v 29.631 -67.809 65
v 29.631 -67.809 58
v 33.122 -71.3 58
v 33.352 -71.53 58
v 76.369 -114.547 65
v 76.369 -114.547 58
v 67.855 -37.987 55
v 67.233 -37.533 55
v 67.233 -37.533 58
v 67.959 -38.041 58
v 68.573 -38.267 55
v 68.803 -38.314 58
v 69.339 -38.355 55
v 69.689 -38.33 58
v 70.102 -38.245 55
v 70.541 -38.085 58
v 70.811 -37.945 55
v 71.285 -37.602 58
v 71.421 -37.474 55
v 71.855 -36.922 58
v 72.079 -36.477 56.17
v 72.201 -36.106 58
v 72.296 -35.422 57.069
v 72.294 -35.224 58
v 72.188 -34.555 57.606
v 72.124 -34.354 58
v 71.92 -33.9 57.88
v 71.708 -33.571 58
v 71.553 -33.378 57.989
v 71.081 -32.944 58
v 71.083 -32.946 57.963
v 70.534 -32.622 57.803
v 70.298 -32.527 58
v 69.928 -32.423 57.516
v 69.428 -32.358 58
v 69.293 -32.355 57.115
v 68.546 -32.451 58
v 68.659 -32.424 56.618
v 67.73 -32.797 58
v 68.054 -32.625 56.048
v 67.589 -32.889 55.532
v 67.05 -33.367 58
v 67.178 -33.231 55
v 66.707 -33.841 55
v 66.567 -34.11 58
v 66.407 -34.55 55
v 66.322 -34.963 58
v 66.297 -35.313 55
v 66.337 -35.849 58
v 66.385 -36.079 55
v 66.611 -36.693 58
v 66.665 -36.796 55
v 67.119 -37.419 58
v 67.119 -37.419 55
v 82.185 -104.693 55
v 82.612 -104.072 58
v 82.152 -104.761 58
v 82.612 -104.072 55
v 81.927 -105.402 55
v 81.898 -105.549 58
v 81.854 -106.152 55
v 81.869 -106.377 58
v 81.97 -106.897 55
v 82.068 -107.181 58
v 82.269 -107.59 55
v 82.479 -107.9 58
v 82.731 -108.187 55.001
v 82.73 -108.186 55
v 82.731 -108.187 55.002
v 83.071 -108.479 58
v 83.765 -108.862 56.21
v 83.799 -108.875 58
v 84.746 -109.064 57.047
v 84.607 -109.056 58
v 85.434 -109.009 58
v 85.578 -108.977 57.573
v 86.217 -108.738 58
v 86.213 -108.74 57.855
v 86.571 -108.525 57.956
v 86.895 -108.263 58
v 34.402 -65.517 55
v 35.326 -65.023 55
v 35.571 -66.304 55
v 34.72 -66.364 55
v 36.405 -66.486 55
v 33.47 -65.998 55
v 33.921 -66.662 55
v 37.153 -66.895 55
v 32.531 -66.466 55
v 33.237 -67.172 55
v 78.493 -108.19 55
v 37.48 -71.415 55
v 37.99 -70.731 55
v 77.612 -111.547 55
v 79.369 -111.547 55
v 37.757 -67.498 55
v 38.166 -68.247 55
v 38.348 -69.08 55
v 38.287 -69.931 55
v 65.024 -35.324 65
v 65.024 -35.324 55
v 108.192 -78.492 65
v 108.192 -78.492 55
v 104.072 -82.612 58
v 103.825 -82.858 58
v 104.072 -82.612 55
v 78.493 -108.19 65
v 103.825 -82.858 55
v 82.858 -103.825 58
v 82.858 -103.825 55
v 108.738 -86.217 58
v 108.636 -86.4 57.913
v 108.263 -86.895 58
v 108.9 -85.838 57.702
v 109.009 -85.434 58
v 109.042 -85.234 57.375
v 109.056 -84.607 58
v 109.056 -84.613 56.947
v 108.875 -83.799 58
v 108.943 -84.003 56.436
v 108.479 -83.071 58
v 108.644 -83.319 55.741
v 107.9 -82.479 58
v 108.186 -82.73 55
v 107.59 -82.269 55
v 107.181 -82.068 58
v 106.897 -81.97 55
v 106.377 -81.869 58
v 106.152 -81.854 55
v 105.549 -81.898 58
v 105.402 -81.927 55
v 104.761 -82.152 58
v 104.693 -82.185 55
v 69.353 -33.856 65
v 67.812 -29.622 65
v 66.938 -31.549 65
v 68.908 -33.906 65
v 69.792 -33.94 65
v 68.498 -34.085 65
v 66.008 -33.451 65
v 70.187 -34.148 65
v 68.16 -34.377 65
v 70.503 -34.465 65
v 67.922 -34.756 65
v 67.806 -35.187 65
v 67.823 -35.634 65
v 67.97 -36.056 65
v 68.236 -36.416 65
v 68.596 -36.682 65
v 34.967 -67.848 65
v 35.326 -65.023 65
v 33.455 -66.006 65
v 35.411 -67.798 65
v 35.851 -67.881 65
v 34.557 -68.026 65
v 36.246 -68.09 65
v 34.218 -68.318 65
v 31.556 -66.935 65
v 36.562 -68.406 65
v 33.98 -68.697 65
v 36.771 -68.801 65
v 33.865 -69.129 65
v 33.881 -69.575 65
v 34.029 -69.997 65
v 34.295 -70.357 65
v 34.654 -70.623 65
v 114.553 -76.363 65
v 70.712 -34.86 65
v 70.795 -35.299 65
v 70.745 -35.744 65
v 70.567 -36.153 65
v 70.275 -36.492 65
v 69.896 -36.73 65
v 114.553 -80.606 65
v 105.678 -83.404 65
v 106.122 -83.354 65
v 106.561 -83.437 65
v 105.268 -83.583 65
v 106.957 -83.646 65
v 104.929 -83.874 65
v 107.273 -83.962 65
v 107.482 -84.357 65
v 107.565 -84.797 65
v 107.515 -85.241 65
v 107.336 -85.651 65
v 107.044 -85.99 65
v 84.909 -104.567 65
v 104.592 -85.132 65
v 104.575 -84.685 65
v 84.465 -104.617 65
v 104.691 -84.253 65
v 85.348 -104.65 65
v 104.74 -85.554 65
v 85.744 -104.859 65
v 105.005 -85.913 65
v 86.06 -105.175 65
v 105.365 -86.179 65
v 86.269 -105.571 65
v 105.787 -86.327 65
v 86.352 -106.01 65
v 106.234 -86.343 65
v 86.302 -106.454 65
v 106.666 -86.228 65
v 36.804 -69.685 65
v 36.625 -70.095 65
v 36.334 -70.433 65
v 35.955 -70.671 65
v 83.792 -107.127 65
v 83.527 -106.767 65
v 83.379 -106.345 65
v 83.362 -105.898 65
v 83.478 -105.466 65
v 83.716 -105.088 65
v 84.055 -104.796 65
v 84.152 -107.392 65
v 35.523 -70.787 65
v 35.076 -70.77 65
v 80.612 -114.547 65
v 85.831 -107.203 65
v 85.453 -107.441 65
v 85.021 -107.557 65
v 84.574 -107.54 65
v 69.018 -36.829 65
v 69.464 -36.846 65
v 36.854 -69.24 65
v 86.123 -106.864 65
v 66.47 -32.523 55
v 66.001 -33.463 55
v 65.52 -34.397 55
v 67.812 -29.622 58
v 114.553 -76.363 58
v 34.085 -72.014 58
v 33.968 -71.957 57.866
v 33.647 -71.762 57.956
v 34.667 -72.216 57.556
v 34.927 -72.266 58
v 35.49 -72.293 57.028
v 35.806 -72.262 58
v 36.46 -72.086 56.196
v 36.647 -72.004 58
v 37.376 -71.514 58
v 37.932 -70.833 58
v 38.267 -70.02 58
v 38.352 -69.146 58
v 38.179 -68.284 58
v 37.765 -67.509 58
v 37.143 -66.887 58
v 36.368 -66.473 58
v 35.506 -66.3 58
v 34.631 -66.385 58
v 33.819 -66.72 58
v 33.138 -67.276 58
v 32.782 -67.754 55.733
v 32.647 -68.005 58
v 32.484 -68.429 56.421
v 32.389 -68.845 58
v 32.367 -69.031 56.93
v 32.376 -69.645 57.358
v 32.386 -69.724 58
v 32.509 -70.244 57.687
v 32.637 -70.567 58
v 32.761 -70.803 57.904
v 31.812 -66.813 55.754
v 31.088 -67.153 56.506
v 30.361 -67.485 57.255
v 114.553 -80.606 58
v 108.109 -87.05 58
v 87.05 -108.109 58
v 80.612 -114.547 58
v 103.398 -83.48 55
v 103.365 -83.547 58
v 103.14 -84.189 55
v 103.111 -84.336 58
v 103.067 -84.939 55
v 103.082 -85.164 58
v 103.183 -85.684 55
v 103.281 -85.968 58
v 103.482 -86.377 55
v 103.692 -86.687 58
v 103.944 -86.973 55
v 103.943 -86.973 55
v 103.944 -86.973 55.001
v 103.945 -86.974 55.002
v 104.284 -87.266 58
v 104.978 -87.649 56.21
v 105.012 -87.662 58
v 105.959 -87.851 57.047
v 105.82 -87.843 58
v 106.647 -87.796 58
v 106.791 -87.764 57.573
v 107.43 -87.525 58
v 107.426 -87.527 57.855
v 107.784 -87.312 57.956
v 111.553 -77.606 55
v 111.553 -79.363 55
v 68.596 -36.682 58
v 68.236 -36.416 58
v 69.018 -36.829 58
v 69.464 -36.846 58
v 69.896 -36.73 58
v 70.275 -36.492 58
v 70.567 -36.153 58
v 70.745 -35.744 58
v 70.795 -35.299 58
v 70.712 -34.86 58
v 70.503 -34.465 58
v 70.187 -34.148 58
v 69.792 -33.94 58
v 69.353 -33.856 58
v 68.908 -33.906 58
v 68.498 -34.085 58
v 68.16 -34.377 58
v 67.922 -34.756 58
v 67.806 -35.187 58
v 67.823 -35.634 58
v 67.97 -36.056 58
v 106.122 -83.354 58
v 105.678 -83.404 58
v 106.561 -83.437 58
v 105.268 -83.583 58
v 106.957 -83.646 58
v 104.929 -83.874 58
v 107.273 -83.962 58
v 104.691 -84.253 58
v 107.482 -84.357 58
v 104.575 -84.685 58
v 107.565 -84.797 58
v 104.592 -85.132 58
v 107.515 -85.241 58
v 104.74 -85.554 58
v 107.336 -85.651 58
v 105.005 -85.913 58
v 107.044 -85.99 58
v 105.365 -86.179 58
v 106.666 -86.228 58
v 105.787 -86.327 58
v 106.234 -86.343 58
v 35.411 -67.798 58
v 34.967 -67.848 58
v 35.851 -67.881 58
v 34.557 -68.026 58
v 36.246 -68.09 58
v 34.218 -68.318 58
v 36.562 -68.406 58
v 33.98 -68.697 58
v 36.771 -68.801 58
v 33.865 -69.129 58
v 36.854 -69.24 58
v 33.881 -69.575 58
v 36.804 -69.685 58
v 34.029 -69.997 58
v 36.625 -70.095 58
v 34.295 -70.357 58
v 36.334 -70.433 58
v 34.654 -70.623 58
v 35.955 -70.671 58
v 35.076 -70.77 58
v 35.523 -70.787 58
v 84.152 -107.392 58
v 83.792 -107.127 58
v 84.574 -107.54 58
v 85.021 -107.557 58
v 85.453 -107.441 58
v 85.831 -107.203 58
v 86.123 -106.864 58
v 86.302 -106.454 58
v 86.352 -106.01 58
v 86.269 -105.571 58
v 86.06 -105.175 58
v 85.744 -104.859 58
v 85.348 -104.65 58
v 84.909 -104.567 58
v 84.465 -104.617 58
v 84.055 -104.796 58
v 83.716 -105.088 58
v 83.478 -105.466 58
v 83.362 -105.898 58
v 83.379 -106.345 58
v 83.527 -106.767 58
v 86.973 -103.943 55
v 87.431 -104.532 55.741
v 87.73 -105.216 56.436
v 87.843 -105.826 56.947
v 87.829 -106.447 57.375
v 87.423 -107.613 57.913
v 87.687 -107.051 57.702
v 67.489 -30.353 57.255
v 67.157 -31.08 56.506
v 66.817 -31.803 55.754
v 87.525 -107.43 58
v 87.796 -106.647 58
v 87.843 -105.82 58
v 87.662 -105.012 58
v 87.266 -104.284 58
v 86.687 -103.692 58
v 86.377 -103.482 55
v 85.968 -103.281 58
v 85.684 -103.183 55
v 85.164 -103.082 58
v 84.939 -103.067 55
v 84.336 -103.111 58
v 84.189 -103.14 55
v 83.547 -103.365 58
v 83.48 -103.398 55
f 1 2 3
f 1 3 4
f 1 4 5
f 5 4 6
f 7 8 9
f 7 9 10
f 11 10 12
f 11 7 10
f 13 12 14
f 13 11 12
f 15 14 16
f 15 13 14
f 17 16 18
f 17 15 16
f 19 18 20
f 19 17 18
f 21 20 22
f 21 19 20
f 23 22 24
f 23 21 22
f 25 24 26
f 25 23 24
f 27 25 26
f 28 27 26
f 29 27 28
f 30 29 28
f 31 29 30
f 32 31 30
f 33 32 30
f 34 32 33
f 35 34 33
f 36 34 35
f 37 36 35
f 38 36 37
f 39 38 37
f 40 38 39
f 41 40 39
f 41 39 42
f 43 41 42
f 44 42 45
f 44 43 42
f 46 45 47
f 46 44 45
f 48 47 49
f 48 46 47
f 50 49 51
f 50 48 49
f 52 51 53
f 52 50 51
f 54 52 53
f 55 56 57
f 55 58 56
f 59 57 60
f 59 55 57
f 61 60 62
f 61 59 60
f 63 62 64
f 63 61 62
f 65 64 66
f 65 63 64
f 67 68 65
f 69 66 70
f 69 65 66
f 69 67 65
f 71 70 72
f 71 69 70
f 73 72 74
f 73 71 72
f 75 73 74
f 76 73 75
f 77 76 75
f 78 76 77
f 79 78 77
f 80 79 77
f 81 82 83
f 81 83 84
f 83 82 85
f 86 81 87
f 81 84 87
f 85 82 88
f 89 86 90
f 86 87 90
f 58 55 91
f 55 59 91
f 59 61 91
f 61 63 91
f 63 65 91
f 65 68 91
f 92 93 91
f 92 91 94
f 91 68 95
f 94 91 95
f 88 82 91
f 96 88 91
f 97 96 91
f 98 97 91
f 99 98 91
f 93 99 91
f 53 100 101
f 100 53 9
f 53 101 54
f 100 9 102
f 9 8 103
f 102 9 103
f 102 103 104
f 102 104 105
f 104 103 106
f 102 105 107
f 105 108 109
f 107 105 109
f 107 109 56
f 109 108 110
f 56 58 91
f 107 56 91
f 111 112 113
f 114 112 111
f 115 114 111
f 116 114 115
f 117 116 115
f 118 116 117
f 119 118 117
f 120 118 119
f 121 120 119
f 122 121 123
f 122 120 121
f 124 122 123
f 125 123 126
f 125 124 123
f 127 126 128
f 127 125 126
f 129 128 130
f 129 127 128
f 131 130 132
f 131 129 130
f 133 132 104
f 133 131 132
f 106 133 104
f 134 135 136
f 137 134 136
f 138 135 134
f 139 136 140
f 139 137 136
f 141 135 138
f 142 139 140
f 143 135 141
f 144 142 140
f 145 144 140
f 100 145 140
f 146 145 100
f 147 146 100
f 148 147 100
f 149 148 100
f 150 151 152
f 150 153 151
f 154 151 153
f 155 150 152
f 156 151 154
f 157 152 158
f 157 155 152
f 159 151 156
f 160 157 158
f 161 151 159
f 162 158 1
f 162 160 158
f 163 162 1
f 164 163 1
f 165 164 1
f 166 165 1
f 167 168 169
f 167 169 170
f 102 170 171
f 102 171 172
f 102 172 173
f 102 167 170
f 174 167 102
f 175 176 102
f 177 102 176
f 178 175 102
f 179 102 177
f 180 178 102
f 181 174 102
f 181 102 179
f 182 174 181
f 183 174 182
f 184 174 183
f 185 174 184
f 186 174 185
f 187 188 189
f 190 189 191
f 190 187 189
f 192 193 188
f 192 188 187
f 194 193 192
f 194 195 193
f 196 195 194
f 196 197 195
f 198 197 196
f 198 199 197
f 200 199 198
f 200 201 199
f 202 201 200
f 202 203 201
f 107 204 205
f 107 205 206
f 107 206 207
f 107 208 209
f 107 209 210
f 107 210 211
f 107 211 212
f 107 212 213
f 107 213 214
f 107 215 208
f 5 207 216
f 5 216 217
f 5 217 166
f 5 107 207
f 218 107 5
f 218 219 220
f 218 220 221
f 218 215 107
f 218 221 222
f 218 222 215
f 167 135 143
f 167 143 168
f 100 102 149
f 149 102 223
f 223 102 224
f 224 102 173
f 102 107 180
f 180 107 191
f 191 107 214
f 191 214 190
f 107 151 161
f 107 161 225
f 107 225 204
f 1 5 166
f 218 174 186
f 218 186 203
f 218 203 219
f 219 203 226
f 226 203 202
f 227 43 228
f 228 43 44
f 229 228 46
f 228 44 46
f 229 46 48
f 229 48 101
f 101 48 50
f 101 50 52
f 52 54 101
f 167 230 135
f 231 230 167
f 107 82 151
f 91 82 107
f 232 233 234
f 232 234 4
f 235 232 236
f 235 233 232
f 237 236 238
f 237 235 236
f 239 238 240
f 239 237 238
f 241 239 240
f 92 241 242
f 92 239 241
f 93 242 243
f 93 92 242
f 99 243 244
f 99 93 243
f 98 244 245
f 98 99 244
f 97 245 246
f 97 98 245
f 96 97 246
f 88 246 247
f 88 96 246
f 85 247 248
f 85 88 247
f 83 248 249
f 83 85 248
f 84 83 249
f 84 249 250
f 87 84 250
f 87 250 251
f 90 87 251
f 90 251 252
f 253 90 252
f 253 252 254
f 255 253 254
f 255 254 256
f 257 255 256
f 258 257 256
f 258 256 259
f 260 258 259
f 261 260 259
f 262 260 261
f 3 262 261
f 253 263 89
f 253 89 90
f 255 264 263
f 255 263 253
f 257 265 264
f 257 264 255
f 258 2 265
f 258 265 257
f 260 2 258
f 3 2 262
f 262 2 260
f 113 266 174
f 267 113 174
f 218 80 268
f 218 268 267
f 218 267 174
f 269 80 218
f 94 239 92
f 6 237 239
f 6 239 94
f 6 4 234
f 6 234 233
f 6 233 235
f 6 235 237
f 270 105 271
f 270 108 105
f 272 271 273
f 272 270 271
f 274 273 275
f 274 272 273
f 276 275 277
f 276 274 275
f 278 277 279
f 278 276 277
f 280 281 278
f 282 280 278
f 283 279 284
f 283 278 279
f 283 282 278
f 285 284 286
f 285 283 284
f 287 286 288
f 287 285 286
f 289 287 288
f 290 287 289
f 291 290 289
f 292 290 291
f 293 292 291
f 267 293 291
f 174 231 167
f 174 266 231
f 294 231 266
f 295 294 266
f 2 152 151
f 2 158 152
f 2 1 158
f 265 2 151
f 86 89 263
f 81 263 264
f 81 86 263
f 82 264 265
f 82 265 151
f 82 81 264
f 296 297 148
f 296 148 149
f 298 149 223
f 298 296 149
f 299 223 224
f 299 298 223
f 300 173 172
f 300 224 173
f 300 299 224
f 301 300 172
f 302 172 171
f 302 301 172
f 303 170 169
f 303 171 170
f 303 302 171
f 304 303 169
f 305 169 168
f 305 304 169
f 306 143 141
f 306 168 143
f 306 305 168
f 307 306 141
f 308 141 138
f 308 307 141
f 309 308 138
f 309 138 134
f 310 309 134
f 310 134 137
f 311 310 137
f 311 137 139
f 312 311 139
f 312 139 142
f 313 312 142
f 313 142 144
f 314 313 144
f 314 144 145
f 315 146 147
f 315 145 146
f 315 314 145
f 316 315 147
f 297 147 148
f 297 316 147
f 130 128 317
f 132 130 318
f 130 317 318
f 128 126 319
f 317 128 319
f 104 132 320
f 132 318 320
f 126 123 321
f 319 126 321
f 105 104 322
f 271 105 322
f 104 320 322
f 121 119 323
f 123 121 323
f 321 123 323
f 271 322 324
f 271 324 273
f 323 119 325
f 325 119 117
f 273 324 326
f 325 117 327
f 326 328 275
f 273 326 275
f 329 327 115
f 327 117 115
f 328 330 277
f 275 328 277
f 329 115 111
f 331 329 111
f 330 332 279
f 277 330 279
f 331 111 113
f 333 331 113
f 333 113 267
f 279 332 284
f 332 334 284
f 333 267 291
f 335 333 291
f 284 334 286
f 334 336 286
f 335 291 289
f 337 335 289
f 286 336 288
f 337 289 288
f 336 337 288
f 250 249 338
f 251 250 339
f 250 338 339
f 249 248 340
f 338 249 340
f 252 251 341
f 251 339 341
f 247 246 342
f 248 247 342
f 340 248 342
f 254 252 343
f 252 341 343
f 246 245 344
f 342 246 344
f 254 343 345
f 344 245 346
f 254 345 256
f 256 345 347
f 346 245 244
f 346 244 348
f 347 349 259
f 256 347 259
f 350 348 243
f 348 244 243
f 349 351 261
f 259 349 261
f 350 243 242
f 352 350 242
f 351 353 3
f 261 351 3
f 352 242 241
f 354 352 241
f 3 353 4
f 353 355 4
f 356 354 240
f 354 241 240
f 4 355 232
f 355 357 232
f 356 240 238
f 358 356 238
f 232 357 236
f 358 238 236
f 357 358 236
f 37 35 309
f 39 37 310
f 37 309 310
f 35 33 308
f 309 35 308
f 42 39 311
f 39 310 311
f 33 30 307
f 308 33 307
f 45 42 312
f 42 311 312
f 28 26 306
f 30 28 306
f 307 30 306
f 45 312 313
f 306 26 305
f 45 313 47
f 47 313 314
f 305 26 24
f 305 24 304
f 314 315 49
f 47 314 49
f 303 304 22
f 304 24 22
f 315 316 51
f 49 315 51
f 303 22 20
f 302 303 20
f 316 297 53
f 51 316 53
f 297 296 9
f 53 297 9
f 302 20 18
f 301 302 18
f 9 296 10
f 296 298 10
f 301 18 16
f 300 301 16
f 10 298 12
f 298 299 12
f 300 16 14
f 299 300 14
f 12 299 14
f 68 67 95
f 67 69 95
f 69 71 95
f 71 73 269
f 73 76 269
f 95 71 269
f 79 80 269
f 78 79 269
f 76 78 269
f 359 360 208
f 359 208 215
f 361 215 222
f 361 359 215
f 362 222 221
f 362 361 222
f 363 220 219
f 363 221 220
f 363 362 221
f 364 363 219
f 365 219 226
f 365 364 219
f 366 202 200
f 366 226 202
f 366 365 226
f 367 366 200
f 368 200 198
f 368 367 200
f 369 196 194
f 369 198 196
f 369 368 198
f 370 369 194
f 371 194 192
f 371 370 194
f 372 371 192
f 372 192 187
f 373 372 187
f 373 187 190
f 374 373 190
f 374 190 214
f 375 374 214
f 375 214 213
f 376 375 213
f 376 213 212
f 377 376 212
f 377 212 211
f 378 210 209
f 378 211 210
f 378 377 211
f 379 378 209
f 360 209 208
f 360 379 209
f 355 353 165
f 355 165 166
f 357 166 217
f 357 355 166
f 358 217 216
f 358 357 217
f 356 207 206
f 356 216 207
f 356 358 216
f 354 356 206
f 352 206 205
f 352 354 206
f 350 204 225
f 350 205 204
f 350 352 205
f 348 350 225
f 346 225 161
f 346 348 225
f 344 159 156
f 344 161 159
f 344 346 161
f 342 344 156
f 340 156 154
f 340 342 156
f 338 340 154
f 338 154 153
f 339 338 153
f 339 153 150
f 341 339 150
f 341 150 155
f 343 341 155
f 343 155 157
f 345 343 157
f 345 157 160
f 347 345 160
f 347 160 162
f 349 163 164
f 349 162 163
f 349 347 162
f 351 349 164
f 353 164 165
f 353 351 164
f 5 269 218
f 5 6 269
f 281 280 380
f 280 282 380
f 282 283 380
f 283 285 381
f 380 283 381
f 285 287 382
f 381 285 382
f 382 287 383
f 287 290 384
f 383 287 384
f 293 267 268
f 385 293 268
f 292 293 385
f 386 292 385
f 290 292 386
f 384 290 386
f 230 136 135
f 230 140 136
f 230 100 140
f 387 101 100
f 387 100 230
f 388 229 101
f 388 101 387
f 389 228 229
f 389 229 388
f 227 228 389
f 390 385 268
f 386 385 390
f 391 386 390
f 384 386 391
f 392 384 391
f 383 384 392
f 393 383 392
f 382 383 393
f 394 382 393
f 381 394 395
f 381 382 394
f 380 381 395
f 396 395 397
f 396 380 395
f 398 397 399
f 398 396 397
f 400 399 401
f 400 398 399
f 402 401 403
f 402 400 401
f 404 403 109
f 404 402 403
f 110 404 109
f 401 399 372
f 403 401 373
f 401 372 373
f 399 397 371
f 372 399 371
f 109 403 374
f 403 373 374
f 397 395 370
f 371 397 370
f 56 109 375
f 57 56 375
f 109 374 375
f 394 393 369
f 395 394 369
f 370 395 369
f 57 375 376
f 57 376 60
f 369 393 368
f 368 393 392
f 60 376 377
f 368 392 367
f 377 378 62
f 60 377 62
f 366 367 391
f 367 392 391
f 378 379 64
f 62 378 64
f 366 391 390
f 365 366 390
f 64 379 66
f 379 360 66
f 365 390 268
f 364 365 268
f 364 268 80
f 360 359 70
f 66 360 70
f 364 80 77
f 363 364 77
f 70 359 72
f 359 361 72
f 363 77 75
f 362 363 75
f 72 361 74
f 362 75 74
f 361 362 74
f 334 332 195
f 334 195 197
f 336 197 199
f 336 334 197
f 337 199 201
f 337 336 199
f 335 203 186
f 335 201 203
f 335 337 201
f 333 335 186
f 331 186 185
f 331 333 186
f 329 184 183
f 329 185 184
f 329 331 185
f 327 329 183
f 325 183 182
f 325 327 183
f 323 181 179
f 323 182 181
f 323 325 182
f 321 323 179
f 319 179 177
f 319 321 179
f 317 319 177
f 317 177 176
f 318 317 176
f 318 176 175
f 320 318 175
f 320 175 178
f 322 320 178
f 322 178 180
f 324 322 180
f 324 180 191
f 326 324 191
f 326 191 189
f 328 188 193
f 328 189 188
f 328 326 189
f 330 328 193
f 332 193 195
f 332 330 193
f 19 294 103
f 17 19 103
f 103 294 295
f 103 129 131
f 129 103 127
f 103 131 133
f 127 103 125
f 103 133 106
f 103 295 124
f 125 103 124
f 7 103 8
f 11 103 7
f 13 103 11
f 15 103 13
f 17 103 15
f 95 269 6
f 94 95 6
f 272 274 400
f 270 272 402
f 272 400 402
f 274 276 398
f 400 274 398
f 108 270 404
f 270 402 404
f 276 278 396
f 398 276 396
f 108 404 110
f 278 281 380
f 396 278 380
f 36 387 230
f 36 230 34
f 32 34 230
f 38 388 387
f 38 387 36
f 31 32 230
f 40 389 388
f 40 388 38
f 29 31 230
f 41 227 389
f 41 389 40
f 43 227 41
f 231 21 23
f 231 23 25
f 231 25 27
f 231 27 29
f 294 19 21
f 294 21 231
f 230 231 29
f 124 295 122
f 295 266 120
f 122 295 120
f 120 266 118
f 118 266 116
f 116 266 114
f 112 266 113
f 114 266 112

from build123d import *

# Parameters (mm, degrees)
CYLINDER1994_R               = 1.5
CYLINDER1994_DEPTH           = 60
CYLINDER1991_R               = 1.5
CYLINDER1991_DEPTH           = 60
CYLINDER1992_R               = 1.5
CYLINDER1992_DEPTH           = 60
CYLINDER1993_R               = 1.5
CYLINDER1993_DEPTH           = 60
COMPOUND1074_PLACEMENT_ANGLE = 225
CYLINDER1990_R               = 3
CYLINDER1990_DEPTH           = 3
CYLINDER1987_R               = 3
CYLINDER1987_DEPTH           = 3
CYLINDER1988_R               = 3
CYLINDER1988_DEPTH           = 3
CYLINDER1989_R               = 3
CYLINDER1989_DEPTH           = 3
COMPOUND1075_PLACEMENT_ANGLE = 225
CYLINDER1986_R               = 74
CYLINDER1986_DEPTH           = 40
BOX985_W                     = 42
BOX985_H                     = 72
BOX985_DEPTH                 = 50
COMPOUND1072_PLACEMENT_ANGLE = 225
BOX986_W                     = 54
BOX986_H                     = 78
BOX986_DEPTH                 = 10
COMPOUND1073_PLACEMENT_ANGLE = 225
CHAMFER076_SIZE              = 3
CHAMFER077_SIZE              = 3


with BuildPart() as v_lec1994:
    # Cylinder1994 → Cylinder1994 (new body)
    with BuildSketch(Plane(origin=(-24, 74, -80), x_dir=(1, 0, 0), z_dir=(0, 0, 1))):
        Circle(CYLINDER1994_R)
    extrude(amount=CYLINDER1994_DEPTH)


with BuildPart() as v_lec1991:
    # Cylinder1991 → Cylinder1991 (new body)
    with BuildSketch(Plane(origin=(-15, 135, -80), x_dir=(1, 0, 0), z_dir=(0, 0, 1))):
        Circle(CYLINDER1991_R)
    extrude(amount=CYLINDER1991_DEPTH)


with BuildPart() as v_lec1992:
    # Cylinder1992 → Cylinder1992 (new body)
    with BuildSketch(Plane(origin=(15, 135, -80), x_dir=(1, 0, 0), z_dir=(0, 0, 1))):
        Circle(CYLINDER1992_R)
    extrude(amount=CYLINDER1992_DEPTH)


with BuildPart() as compound1074:
    # Cylinder1993 → Cylinder1993 (new body)
    with BuildSketch(Plane(origin=(24, 74, -80), x_dir=(1, 0, 0), z_dir=(0, 0, 1))):
        Circle(CYLINDER1993_R)
    extrude(amount=CYLINDER1993_DEPTH)

    # Compound1074: union Válec1994, Válec1991, Válec1992
    add(v_lec1994.part)
    add(v_lec1991.part)
    add(v_lec1992.part)


with BuildPart() as compound1074_1:
    # Compound1074 placement: moved
    add(compound1074.part.moved(Location((0, 0, 100))).rotate(Axis((0, 0, 100), (0, 0, 1)), COMPOUND1074_PLACEMENT_ANGLE))


with BuildPart() as v_lec1990:
    # Cylinder1990 → Cylinder1990 (new body)
    with BuildSketch(Plane(origin=(-24, 74, -80), x_dir=(1, 0, 0), z_dir=(0, 0, 1))):
        Circle(CYLINDER1990_R)
    extrude(amount=CYLINDER1990_DEPTH)


with BuildPart() as v_lec1987:
    # Cylinder1987 → Cylinder1987 (new body)
    with BuildSketch(Plane(origin=(-15, 135, -80), x_dir=(1, 0, 0), z_dir=(0, 0, 1))):
        Circle(CYLINDER1987_R)
    extrude(amount=CYLINDER1987_DEPTH)


with BuildPart() as v_lec1988:
    # Cylinder1988 → Cylinder1988 (new body)
    with BuildSketch(Plane(origin=(15, 135, -80), x_dir=(1, 0, 0), z_dir=(0, 0, 1))):
        Circle(CYLINDER1988_R)
    extrude(amount=CYLINDER1988_DEPTH)


with BuildPart() as compound1075:
    # Cylinder1989 → Cylinder1989 (new body)
    with BuildSketch(Plane(origin=(24, 74, -80), x_dir=(1, 0, 0), z_dir=(0, 0, 1))):
        Circle(CYLINDER1989_R)
    extrude(amount=CYLINDER1989_DEPTH)

    # Compound1075: union Válec1990, Válec1987, Válec1988
    add(v_lec1990.part)
    add(v_lec1987.part)
    add(v_lec1988.part)


with BuildPart() as compound1075_1:
    # Compound1075 placement: moved
    add(compound1075.part.moved(Location((0, 0, 135))).rotate(Axis((0, 0, 135), (0, 0, 1)), COMPOUND1075_PLACEMENT_ANGLE))


with BuildPart() as v_lec1986:
    # Cylinder1986 → Cylinder1986 (new body)
    with BuildSketch(Plane.XY.offset(44)):
        Circle(CYLINDER1986_R)
    extrude(amount=CYLINDER1986_DEPTH)


with BuildPart() as compound1072:
    # Box985 → Box985 (new body)
    with BuildSketch(Plane(origin=(-21.001071, 60.005081, 31), x_dir=(1, 0, 0), z_dir=(0, 0, 1))):
        with Locations((21, 36)):
            Rectangle(BOX985_W, BOX985_H)
    extrude(amount=BOX985_DEPTH)


with BuildPart() as compound1072_1:
    # Compound1072 placement: moved
    add(compound1072.part.rotate(Axis((0, 0, 0), (0, 0, 1)), COMPOUND1072_PLACEMENT_ANGLE))


with BuildPart() as cut676:
    # Box986 → Box986 (new body)
    with BuildSketch(Plane(origin=(-27.004408, 59.99801, 75), x_dir=(1, 0, 0), z_dir=(0, 0, 1))):
        with Locations((27, 39)):
            Rectangle(BOX986_W, BOX986_H)
    extrude(amount=BOX986_DEPTH)


with BuildPart() as cut676_1:
    # Compound1073 placement: moved
    add(cut676.part.moved(Location((0, 0, -20))).rotate(Axis((0, 0, -20), (0, 0, 1)), COMPOUND1073_PLACEMENT_ANGLE))

    # Cut670: cut Compound1072
    add(compound1072_1.part, mode=Mode.SUBTRACT)

    # Cut671: cut Válec1986
    add(v_lec1986.part, mode=Mode.SUBTRACT)

    # Chamfer076
    chamfer076_edges = [cut676_1.edges().sort_by_distance(p)[0] for p in [
        (116.674329, -78.484329, 60),
        (78.490563, -116.668095, 60),
    ]]
    chamfer(chamfer076_edges, length=CHAMFER076_SIZE)

    # Chamfer077
    chamfer077_edges = [cut676_1.edges().sort_by_distance(p)[0] for p in [
        (91.182683, -52.992683, 55),
        (114.553009, -78.484329, 55),
        (53.000139, -91.177671, 55),
        (78.490563, -114.546775, 55),
        (97.582446, -97.576212, 55),
    ]]
    chamfer(chamfer077_edges, length=CHAMFER077_SIZE)

    # Cut675: cut Compound1075
    add(compound1075_1.part, mode=Mode.SUBTRACT)

    # Cut676: cut Compound1074
    add(compound1074_1.part, mode=Mode.SUBTRACT)


solid = cut676_1.part
